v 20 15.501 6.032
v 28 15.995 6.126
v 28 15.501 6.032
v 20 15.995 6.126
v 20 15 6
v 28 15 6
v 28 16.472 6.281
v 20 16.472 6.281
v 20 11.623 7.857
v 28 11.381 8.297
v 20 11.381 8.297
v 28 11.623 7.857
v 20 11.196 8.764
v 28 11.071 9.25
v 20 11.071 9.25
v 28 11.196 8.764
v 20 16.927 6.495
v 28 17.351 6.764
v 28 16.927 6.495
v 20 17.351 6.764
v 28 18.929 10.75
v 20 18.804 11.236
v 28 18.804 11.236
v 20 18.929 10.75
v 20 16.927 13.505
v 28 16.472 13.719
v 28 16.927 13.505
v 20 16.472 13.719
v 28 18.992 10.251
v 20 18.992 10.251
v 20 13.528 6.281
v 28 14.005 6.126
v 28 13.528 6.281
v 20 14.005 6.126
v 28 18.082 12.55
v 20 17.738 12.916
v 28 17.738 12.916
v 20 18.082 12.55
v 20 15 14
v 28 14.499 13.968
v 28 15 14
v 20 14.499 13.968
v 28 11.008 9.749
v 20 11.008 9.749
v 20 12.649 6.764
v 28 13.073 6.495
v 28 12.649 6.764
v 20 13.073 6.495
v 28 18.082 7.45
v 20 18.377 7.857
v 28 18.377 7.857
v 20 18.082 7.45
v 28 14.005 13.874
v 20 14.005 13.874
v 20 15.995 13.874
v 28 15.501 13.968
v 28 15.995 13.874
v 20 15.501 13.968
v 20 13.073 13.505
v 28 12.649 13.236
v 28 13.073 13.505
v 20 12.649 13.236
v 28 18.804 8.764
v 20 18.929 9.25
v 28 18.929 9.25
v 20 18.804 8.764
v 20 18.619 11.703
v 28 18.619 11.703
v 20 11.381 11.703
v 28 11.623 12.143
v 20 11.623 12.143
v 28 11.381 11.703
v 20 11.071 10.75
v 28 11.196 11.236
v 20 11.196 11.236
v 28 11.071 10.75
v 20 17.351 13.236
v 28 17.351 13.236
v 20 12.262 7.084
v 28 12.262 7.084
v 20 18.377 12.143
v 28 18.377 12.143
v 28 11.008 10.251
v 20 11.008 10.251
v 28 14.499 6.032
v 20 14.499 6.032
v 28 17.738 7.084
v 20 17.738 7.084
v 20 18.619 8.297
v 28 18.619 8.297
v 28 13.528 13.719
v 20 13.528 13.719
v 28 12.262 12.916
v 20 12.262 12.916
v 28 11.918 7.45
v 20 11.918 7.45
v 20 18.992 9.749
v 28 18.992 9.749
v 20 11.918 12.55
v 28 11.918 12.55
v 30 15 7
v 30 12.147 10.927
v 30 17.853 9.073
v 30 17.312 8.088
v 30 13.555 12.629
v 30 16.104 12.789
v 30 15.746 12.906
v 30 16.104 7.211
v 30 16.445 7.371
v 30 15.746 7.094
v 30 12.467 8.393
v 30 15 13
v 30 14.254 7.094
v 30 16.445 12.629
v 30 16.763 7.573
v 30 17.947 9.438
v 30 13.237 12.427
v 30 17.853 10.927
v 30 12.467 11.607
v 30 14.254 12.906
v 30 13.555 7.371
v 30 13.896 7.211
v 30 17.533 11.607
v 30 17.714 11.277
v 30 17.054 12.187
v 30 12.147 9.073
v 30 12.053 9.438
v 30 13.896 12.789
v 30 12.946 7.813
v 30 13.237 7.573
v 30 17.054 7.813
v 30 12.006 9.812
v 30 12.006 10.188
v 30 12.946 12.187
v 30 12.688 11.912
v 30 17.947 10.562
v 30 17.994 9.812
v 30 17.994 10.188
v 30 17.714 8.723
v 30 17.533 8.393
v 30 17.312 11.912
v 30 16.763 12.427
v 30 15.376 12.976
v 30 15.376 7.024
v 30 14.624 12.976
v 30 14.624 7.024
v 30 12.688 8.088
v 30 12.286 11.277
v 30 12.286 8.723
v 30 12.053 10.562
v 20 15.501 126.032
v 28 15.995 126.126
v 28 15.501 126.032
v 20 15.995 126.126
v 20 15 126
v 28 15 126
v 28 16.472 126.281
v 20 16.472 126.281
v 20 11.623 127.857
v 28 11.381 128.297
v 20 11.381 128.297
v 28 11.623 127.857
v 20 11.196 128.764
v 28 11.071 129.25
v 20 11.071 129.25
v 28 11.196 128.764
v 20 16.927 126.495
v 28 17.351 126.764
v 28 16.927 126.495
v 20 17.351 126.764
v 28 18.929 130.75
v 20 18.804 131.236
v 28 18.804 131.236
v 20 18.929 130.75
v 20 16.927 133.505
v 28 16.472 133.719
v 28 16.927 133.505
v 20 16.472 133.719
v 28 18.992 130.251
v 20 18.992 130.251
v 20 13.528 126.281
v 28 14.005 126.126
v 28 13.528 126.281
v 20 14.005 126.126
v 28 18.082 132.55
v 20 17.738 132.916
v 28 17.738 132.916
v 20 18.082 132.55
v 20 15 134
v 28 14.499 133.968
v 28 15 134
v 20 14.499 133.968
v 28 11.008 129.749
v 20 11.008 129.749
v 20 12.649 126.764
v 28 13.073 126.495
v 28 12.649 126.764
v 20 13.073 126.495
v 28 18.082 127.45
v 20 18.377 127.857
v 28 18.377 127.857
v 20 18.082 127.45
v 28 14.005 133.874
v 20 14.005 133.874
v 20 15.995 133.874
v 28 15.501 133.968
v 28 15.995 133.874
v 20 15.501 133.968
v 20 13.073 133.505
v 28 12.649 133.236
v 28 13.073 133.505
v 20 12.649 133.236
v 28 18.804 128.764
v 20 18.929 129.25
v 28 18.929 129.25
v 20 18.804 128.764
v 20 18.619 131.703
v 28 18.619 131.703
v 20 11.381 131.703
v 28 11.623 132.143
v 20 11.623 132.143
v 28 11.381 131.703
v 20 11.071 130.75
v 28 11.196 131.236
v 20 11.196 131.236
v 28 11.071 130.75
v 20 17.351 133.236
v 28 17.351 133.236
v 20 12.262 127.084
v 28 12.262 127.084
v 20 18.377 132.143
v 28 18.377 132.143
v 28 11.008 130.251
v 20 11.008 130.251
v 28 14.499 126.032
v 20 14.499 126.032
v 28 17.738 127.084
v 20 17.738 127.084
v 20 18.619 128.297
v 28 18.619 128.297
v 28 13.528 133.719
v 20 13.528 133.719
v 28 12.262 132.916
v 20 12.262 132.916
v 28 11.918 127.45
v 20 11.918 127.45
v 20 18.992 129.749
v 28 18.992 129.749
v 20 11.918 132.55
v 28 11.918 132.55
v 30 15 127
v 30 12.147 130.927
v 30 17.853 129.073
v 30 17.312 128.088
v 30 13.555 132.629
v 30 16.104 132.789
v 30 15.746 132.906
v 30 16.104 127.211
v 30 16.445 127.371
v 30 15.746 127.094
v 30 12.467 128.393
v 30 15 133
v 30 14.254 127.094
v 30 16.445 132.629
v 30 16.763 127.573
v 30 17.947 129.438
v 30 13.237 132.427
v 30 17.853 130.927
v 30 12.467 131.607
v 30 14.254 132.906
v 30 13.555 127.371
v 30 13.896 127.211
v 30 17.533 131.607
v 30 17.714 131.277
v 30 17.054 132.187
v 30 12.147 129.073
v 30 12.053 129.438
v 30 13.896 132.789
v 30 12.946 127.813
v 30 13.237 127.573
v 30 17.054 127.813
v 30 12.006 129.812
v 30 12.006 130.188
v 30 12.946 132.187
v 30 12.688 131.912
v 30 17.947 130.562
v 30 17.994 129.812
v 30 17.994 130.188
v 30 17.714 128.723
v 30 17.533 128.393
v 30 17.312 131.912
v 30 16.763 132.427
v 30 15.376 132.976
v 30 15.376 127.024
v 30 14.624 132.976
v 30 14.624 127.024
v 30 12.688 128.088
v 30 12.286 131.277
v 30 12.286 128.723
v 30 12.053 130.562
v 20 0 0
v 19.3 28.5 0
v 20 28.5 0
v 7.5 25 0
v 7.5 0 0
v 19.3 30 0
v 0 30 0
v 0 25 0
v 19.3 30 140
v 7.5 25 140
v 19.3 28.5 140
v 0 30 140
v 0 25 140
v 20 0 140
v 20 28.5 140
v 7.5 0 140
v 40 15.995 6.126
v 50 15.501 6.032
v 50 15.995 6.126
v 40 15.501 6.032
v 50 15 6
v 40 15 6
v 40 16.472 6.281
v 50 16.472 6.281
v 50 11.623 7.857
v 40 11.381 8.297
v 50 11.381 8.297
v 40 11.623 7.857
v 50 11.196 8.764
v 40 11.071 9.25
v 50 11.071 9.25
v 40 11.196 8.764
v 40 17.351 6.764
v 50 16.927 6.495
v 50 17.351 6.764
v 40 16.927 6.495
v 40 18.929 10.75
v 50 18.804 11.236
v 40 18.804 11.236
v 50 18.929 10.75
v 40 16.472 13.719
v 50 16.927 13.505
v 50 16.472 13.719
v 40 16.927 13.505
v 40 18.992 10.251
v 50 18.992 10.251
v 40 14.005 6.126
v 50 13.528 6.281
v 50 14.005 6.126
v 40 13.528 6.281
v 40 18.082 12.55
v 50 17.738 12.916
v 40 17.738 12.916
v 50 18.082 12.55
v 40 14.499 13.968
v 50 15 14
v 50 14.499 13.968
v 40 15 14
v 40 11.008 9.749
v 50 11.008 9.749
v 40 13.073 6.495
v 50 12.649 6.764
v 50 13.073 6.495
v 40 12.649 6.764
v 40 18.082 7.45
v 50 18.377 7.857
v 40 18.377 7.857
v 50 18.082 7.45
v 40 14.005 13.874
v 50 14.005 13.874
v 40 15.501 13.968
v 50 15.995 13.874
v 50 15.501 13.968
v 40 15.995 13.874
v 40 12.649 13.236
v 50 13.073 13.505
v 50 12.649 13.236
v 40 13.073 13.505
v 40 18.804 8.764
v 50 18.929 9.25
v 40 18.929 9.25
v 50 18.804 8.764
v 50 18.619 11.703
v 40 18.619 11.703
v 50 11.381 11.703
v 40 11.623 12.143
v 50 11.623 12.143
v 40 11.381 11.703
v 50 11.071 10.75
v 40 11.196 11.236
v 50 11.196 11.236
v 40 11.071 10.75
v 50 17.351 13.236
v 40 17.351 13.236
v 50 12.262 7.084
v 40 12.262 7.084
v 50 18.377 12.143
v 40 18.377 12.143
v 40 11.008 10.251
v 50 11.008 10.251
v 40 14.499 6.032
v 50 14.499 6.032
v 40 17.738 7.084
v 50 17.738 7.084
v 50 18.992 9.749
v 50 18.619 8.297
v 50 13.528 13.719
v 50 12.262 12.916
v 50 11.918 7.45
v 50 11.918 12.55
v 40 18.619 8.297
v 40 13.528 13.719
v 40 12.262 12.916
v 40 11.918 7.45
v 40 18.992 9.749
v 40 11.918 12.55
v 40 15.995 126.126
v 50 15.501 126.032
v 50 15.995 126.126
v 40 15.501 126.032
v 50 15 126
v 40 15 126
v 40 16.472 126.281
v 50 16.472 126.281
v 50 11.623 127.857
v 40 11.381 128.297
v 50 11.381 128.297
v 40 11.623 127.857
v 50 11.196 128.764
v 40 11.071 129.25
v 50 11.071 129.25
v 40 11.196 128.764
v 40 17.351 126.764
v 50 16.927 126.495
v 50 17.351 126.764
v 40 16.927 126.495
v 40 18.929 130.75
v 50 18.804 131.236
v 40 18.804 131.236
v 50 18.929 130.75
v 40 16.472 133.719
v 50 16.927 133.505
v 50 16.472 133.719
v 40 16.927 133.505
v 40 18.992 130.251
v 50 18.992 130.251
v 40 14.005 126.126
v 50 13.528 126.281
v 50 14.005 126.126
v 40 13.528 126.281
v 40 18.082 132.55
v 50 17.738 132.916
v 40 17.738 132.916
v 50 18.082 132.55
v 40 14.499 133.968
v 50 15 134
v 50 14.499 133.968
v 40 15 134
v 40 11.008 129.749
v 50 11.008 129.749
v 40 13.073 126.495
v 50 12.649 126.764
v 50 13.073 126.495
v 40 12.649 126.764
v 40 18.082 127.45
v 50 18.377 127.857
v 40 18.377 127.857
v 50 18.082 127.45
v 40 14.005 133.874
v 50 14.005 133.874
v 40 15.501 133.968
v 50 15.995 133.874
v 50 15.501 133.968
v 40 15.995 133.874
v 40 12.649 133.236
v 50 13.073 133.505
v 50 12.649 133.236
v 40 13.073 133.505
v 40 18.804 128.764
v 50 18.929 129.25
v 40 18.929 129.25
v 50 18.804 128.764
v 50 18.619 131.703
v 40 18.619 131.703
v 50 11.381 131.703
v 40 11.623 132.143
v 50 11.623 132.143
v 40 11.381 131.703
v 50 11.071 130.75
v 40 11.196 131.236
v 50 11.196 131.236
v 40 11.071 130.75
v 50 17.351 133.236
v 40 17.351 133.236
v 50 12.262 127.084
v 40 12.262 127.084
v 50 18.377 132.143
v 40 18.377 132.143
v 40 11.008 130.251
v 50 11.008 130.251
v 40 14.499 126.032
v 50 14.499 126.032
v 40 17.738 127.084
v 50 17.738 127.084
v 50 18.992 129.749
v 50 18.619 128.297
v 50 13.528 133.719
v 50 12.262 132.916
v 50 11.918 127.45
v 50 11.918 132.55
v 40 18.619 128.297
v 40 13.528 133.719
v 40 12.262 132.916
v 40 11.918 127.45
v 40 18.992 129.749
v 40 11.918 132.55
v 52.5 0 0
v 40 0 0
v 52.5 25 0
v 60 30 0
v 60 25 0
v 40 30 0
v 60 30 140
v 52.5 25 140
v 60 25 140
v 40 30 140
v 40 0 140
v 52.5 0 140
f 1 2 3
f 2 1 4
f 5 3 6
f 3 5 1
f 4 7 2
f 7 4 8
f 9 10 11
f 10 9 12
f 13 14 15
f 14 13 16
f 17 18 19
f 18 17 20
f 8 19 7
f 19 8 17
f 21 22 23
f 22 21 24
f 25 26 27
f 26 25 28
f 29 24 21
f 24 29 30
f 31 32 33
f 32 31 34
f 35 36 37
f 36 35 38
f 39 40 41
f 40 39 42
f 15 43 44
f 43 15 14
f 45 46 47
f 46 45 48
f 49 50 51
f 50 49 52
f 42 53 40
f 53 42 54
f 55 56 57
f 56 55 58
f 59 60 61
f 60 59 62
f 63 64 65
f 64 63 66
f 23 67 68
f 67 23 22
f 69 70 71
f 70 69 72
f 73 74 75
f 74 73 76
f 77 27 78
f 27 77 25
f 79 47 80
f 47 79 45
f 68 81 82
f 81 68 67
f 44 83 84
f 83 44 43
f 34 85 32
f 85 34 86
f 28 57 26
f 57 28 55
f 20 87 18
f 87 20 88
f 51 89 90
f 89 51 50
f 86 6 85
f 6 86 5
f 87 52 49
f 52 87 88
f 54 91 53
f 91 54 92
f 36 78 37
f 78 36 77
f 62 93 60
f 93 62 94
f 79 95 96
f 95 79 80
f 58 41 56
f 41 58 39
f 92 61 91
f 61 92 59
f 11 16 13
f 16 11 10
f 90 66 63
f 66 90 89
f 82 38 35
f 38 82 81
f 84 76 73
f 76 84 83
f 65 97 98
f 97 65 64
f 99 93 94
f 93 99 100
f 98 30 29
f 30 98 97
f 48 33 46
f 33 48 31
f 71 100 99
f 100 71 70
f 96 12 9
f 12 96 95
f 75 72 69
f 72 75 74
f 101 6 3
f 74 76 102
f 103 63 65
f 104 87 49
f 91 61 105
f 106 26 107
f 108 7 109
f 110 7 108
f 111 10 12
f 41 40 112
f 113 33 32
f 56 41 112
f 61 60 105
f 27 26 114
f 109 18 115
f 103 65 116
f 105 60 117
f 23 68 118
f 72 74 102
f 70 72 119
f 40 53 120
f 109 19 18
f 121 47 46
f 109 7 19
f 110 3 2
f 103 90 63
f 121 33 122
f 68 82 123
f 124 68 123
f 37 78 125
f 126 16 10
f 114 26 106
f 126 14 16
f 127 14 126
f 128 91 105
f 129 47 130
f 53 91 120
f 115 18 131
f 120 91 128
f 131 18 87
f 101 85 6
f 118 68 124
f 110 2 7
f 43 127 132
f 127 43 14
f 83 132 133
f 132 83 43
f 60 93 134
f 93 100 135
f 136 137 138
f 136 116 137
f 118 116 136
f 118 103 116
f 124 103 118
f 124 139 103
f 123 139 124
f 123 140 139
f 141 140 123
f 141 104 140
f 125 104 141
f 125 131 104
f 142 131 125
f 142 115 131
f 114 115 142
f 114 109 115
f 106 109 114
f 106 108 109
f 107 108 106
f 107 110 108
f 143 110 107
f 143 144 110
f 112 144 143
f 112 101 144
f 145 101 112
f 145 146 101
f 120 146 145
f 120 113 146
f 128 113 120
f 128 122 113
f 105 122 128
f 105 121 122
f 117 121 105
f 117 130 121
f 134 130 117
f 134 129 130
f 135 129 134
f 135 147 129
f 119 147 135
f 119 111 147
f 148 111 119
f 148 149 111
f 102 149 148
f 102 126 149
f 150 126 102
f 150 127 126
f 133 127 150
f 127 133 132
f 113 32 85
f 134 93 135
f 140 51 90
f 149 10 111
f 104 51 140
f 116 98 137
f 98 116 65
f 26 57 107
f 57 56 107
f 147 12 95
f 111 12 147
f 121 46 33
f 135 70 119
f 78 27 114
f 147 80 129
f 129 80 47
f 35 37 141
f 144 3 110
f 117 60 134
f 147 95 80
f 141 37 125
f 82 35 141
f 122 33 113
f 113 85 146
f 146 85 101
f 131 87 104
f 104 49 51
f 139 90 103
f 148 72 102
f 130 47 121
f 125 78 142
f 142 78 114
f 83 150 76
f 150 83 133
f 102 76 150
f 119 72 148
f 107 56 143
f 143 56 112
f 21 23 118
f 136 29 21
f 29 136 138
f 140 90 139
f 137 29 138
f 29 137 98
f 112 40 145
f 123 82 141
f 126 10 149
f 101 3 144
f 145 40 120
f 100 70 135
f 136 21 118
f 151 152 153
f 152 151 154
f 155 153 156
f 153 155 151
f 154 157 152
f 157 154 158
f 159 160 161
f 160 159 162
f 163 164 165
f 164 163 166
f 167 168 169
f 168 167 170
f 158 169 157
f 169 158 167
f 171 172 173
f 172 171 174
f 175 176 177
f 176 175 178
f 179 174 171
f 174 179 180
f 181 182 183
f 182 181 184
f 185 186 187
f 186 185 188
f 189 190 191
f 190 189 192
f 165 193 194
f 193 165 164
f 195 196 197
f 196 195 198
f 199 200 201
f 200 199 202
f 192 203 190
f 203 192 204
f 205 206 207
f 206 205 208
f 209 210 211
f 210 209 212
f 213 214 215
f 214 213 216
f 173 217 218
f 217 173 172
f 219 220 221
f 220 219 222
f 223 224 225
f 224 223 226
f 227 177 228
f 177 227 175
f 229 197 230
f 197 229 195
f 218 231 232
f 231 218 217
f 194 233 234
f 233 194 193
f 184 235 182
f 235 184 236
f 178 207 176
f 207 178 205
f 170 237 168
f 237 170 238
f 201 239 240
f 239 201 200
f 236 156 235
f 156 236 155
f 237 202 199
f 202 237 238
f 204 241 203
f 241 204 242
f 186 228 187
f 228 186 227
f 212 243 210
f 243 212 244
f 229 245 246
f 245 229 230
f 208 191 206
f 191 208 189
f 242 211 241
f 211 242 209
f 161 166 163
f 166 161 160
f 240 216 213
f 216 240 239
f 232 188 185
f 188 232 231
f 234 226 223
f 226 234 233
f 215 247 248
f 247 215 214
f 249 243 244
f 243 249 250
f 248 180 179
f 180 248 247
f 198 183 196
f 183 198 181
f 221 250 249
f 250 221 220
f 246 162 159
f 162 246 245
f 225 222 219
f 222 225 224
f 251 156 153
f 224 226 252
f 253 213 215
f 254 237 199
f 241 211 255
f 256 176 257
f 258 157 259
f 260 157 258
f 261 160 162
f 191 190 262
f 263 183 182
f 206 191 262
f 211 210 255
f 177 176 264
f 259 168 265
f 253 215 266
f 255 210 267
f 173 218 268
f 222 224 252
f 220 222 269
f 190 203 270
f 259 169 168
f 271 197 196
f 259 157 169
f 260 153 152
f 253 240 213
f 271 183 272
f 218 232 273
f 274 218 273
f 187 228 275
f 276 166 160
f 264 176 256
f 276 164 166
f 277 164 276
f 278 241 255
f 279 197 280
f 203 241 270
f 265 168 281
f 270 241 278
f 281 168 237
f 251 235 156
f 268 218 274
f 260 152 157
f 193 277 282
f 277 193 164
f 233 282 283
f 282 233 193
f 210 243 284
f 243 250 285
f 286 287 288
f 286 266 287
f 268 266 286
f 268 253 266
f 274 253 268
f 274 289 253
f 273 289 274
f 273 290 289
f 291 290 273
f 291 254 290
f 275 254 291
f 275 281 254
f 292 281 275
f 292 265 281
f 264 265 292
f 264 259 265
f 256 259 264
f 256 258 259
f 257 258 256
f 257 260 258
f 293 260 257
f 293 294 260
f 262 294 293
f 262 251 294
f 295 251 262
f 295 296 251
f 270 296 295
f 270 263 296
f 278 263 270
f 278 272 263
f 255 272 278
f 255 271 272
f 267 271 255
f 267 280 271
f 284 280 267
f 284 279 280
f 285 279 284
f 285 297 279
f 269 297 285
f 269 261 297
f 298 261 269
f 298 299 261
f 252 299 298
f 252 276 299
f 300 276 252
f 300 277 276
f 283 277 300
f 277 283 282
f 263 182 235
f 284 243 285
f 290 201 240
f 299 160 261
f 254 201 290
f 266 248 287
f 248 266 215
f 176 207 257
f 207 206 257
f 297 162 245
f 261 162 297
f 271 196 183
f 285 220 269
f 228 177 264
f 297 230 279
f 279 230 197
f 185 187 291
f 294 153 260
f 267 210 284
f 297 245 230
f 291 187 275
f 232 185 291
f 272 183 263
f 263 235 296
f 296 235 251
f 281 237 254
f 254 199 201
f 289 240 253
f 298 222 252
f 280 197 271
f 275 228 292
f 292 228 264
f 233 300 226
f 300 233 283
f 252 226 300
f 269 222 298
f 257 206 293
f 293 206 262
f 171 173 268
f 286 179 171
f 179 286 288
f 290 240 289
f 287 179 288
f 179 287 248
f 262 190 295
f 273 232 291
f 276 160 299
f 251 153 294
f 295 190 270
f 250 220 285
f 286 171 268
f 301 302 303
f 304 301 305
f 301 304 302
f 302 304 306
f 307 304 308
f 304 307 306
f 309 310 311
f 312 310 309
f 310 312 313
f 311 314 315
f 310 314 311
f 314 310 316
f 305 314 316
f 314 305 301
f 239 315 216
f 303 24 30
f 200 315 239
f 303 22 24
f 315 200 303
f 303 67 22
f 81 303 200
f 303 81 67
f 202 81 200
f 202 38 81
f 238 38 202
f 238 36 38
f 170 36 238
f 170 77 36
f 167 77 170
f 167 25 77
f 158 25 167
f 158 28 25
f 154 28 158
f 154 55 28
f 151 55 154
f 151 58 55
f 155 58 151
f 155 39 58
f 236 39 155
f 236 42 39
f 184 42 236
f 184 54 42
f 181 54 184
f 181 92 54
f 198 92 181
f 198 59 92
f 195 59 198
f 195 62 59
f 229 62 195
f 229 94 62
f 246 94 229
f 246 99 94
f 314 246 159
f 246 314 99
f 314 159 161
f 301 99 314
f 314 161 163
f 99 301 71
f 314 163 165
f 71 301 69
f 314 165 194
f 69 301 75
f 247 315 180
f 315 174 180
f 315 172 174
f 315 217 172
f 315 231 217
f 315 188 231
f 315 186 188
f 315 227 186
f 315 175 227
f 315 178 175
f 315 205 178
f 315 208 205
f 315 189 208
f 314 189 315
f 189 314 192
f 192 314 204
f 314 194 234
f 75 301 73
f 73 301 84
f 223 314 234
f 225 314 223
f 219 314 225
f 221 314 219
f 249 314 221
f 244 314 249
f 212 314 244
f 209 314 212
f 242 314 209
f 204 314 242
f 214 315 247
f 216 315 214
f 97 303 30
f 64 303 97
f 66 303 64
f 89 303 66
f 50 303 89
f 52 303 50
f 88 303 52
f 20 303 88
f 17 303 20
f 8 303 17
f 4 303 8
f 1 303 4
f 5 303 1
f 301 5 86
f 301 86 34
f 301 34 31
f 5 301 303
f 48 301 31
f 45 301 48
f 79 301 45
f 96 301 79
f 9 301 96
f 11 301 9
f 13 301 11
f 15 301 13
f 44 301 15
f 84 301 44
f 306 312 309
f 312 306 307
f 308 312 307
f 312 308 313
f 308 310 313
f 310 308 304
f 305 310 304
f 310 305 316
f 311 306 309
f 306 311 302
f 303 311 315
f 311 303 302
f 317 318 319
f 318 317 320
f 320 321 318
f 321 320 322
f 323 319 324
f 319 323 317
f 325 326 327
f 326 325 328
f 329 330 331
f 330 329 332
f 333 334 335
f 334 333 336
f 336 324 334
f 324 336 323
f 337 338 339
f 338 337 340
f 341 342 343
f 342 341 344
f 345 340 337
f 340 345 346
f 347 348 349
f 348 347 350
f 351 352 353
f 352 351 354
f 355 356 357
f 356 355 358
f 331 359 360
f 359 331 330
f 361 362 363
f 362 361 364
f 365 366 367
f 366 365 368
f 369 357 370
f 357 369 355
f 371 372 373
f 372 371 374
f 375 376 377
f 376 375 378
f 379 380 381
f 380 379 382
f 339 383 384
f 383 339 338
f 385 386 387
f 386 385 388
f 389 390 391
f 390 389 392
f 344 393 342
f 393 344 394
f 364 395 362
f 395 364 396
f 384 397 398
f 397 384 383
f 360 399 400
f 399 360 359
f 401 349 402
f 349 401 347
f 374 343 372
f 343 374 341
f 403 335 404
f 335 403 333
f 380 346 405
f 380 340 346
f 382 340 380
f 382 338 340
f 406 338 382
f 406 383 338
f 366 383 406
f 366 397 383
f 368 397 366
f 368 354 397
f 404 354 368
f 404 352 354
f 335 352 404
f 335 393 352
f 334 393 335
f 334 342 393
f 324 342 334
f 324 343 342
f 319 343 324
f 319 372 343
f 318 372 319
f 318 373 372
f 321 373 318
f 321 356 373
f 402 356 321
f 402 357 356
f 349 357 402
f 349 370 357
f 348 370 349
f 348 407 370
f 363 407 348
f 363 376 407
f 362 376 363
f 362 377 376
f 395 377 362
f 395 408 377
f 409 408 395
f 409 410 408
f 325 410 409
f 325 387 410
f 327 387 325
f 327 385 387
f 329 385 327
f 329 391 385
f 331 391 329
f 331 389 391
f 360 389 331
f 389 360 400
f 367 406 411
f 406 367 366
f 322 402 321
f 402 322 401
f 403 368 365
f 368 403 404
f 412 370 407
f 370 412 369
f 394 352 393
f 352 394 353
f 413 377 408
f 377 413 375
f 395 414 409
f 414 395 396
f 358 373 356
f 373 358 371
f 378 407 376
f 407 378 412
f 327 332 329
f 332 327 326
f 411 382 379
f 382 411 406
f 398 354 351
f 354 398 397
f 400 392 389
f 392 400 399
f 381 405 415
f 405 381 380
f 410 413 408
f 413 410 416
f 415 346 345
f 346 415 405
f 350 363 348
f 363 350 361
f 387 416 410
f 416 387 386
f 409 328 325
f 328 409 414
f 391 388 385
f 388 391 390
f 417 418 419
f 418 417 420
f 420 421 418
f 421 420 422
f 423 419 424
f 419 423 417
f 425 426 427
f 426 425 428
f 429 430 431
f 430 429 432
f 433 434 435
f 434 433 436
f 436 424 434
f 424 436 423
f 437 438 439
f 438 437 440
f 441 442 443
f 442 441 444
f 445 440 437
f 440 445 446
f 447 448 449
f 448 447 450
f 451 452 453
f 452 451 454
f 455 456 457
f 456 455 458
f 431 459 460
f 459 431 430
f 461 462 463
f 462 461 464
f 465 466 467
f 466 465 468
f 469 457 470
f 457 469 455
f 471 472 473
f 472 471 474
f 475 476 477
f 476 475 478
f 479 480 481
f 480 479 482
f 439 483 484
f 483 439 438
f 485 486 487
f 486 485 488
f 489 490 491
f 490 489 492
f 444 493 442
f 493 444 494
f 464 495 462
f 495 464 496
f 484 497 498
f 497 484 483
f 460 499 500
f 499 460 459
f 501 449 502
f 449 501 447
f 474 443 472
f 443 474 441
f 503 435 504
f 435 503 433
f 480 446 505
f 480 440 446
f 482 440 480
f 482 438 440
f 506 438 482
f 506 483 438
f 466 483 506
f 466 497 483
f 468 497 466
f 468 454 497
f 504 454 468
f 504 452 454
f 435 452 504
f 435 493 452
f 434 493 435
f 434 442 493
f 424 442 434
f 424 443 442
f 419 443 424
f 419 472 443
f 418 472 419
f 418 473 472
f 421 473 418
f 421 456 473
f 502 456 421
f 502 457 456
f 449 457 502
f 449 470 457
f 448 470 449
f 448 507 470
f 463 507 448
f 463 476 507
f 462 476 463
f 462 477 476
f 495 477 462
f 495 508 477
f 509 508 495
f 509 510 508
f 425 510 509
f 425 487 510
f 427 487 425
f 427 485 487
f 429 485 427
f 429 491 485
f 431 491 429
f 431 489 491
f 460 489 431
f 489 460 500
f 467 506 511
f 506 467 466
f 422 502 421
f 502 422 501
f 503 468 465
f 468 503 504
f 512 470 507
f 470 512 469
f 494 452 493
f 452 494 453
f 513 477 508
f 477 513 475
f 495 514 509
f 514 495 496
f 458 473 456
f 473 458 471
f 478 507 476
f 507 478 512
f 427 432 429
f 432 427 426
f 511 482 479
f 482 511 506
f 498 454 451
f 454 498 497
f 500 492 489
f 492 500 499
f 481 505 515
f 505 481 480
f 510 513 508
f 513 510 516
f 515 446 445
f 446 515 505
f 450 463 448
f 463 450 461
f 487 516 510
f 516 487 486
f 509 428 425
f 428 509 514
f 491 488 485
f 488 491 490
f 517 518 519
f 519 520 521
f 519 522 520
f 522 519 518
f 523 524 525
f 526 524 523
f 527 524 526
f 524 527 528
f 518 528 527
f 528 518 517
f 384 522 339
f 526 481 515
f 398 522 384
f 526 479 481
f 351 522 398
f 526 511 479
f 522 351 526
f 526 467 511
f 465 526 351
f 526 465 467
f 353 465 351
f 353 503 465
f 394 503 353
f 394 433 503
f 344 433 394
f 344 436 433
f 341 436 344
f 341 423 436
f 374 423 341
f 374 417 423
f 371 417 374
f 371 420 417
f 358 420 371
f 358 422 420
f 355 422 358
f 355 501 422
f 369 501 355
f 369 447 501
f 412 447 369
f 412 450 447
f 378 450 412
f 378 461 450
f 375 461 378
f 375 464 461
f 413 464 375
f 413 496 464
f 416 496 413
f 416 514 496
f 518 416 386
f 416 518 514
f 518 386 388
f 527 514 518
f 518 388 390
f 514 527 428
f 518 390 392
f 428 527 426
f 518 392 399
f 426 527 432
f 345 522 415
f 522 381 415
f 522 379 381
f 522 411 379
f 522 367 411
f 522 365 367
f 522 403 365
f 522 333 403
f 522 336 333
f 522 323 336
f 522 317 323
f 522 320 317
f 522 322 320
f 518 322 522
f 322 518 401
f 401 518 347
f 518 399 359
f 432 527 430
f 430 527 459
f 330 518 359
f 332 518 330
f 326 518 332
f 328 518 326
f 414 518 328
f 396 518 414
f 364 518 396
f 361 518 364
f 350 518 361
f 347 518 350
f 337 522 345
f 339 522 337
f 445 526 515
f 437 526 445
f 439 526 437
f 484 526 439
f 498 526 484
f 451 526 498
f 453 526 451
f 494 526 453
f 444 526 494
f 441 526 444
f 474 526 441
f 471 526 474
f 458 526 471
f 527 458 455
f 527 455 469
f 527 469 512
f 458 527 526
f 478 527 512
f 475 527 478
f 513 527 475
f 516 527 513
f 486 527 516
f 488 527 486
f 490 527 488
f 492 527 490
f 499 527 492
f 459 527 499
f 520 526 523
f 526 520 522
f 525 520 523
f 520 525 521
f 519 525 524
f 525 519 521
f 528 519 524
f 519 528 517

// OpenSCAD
// Vice blocks for scribe/snap

REBATE_W = 0.8 - 0.1;
REBATE_H = 1.5;

H = 30;
W = 140;
PIN_DIA = 8;

$fn = 50;
t = 0.01;

difference() {
    union() {
        Block();
        Pins();
    }
    // Rebate
    translate([20 - REBATE_W, H - REBATE_H, -t]) cube([REBATE_W + t, REBATE_H + t, W + 2 * t]);
}

translate([60,0,0]) mirror([1,0,0]) difference() {
    Block();
    Pins();
}

module Pins(isMask=false) {
    gap = (isMask ? 0.2 : 0);
    dia = PIN_DIA + 2*gap;
    for (z = [10, W-10]) {
        translate([10, H/2 + gap, z]) rotate([0, 90, 0]) {
            cylinder(d = dia, h = 10 + 10 - 2);
            translate([0,0,10 + 10 - 2]) cylinder(r1=dia/2, r2=dia/2-1, h = 2);
        }
    }
}

module Block() {
    linear_extrude(W) difference() {
        // Main
        square([20, H]);
        // Vice
        square([7.5, H - 5]);
    }
}
